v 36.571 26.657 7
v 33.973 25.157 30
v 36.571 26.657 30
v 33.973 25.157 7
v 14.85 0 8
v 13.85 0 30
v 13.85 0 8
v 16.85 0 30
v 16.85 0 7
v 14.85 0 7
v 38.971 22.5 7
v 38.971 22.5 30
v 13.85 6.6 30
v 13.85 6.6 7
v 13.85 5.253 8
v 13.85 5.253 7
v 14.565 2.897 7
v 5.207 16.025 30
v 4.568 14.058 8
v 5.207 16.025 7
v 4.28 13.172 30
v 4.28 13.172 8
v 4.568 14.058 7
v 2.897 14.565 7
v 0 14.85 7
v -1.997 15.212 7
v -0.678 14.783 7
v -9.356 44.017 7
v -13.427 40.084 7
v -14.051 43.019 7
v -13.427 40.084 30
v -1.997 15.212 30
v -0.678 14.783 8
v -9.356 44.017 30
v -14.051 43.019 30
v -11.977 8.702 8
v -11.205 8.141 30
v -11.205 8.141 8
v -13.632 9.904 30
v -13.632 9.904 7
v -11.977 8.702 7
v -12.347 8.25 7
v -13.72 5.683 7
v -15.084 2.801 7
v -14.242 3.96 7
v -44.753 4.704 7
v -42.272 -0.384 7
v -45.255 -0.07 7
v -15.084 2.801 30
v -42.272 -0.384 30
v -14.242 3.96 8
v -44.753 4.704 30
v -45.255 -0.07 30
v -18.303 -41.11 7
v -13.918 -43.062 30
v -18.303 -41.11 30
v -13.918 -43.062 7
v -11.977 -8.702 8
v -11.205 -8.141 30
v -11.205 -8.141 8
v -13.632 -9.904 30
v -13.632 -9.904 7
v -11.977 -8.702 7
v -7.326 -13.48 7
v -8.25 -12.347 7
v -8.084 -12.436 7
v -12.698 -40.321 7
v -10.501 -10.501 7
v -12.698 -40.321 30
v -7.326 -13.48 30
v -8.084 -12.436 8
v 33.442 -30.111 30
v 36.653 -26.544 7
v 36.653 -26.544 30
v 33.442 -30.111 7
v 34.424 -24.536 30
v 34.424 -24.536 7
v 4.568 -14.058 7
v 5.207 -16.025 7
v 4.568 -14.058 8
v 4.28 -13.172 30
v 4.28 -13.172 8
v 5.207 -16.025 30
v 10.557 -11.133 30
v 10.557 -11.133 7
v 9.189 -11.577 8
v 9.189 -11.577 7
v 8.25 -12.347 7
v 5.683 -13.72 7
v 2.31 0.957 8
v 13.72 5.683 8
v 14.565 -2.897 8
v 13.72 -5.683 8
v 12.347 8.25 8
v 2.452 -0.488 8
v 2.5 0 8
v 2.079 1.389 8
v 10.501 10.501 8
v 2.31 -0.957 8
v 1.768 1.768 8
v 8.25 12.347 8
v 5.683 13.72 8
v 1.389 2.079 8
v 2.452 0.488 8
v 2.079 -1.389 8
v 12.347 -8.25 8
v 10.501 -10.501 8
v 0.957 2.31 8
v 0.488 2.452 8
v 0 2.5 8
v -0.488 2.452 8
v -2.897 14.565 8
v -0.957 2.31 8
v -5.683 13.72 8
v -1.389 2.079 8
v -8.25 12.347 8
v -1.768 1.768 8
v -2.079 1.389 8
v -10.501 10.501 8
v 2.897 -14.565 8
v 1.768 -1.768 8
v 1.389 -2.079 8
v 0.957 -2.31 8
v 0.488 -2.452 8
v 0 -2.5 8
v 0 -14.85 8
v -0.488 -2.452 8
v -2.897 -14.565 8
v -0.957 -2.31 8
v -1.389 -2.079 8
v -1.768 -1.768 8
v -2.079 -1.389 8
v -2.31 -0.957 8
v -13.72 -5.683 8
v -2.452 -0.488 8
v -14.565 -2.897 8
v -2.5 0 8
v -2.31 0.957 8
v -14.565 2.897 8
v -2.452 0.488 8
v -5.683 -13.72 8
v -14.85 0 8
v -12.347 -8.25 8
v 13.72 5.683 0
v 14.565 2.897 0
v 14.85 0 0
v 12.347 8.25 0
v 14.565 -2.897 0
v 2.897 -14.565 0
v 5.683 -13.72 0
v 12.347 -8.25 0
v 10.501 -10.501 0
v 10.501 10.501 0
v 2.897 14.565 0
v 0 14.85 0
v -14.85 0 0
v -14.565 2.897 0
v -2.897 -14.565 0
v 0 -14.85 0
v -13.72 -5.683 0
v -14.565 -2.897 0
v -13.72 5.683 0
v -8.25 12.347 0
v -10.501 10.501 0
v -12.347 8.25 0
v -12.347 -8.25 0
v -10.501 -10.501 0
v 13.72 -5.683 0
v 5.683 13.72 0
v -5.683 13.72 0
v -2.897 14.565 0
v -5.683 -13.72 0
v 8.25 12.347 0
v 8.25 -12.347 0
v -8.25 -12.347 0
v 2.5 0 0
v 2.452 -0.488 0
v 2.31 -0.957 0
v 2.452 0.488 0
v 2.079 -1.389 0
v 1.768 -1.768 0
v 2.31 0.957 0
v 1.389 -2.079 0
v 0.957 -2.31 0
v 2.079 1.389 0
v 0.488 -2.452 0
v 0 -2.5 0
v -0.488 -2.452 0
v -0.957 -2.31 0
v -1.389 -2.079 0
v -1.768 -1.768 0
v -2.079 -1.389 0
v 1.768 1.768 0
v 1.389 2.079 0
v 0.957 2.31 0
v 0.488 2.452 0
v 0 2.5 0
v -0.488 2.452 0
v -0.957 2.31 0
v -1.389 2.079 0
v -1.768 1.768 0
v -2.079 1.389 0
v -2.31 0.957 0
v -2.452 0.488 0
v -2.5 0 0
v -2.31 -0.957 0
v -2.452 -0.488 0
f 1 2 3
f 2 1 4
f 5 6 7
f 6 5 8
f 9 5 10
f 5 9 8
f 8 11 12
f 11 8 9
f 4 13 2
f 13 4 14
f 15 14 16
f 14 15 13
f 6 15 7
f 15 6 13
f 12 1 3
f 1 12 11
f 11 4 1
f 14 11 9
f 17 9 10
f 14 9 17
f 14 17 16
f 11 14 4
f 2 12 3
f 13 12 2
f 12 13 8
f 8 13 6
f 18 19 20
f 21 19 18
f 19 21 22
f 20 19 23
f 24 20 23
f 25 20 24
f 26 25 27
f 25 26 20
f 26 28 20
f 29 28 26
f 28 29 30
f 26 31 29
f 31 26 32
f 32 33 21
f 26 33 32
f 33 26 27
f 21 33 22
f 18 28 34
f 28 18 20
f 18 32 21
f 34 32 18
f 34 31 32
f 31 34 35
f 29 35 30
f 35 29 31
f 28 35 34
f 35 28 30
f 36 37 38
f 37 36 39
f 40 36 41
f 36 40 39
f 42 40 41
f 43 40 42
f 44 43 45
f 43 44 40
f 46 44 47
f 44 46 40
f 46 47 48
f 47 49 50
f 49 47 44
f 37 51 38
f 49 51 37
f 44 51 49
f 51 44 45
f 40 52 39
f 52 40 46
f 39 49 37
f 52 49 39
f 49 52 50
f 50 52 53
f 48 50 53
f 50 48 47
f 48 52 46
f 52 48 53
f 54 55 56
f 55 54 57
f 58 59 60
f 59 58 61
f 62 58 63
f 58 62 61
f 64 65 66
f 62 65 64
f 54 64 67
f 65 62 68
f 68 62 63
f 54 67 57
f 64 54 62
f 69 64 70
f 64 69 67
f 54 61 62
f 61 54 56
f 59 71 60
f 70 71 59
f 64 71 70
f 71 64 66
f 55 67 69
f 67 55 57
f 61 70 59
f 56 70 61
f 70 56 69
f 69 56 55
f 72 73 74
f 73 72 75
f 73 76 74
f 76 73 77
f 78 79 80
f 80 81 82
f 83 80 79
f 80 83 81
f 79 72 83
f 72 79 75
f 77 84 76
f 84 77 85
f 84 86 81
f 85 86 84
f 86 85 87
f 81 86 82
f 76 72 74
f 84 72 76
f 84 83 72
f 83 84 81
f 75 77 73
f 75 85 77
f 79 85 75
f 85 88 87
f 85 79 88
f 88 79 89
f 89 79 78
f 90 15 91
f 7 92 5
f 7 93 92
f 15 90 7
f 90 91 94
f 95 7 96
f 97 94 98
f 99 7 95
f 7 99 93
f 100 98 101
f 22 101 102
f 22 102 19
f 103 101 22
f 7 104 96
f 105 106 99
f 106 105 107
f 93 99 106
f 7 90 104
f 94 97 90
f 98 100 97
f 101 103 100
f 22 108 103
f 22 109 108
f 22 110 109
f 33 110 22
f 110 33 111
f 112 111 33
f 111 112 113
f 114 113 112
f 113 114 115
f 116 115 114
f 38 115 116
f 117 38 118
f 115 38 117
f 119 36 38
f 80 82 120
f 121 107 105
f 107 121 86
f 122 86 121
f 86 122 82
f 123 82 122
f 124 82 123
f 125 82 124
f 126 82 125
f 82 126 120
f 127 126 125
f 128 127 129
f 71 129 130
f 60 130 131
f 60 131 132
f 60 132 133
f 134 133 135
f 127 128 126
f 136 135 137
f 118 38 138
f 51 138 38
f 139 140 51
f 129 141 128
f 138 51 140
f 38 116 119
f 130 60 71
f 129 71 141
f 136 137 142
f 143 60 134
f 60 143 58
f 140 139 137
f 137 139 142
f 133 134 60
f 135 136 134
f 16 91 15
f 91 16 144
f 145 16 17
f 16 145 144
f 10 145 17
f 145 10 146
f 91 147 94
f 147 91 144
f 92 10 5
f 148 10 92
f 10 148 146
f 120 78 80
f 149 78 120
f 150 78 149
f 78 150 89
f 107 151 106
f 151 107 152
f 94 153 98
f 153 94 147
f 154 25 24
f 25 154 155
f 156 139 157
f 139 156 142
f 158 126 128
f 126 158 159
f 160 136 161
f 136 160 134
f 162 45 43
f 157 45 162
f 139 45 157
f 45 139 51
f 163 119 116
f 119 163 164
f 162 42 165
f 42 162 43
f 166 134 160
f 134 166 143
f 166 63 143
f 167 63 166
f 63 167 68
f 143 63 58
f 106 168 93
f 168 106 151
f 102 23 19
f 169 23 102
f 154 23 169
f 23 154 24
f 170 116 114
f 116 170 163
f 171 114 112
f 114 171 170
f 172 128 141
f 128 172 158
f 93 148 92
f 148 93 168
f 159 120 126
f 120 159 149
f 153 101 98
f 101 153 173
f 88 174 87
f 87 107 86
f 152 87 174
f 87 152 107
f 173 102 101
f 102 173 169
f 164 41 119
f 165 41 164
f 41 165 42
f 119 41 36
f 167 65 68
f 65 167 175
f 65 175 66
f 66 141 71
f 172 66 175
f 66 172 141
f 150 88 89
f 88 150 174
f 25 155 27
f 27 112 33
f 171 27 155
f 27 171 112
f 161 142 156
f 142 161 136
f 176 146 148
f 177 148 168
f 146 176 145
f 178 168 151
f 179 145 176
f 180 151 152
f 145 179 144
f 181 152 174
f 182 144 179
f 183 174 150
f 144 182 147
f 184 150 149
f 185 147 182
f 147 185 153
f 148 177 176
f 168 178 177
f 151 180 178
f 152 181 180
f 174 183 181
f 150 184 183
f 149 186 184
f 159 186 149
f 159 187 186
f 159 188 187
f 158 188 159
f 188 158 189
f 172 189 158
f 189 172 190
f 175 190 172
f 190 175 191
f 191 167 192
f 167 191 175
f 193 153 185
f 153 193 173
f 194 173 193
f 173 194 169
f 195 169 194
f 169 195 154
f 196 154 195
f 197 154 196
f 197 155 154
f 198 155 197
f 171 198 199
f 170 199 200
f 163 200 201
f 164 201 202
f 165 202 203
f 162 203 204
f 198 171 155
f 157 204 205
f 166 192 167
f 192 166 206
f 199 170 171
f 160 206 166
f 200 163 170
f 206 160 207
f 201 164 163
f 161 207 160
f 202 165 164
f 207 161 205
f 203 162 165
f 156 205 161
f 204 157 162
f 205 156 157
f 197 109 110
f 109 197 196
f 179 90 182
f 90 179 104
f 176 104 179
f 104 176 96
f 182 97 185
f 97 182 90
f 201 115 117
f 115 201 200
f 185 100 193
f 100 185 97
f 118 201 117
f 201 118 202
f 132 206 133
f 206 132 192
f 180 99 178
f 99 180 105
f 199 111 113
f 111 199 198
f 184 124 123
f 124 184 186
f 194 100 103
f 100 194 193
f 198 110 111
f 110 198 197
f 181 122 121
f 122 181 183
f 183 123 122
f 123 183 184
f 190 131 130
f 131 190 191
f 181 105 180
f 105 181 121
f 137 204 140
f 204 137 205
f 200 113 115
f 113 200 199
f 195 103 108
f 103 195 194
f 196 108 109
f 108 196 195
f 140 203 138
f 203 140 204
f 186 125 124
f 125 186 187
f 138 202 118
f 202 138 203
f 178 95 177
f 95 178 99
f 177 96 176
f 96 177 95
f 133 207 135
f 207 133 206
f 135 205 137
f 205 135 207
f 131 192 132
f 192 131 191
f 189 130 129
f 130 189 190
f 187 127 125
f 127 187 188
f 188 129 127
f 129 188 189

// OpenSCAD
$fn = 32;

// ----------------------------------------------------------------------
// Impeller: 90 mm, 5 blades, 30 mm tall
// ----------------------------------------------------------------------

// --- parameters (mm) ---
hub_d = 29.7;             // hub diameter
hub_h = 8;                // hub height
imp_d = 90;               // outer diameter over the blades
blades = 5;               // number of blades
blade_t = 3;              // blade thickness
blade_h = 22;             // blade height
blade_in_r = 13.85;       // blade root radius
blade_out_r = 42;         // blade tip radius
sweep = 30;               // blade sweep, degrees
bore_d = 5;               // shaft bore

module hub() {
  cylinder(h = hub_h, d = hub_d);
}

module blade() {
  /* blade swept between two boxes: hull of the root and the tip section */
  hull() {
    translate([blade_in_r, 0, hub_h - 1])
      cube([blade_t, blade_t * 2.2, blade_h + 1], center = false);
    rotate([0, 0, sweep])
      translate([blade_out_r, 0, hub_h - 1])
        cube([blade_t, blade_t * 1.6, blade_h + 1], center = false);
  }
}

module blades() {
  for (i = [0 : blades - 1])
    rotate([0, 0, i * 360 / blades]) blade();
}

difference() {
  union() {
    hub();
    blades();
  }
  translate([0, 0, -1]) cylinder(h = hub_h + blade_h + 0 + 3, d = bore_d);
}
